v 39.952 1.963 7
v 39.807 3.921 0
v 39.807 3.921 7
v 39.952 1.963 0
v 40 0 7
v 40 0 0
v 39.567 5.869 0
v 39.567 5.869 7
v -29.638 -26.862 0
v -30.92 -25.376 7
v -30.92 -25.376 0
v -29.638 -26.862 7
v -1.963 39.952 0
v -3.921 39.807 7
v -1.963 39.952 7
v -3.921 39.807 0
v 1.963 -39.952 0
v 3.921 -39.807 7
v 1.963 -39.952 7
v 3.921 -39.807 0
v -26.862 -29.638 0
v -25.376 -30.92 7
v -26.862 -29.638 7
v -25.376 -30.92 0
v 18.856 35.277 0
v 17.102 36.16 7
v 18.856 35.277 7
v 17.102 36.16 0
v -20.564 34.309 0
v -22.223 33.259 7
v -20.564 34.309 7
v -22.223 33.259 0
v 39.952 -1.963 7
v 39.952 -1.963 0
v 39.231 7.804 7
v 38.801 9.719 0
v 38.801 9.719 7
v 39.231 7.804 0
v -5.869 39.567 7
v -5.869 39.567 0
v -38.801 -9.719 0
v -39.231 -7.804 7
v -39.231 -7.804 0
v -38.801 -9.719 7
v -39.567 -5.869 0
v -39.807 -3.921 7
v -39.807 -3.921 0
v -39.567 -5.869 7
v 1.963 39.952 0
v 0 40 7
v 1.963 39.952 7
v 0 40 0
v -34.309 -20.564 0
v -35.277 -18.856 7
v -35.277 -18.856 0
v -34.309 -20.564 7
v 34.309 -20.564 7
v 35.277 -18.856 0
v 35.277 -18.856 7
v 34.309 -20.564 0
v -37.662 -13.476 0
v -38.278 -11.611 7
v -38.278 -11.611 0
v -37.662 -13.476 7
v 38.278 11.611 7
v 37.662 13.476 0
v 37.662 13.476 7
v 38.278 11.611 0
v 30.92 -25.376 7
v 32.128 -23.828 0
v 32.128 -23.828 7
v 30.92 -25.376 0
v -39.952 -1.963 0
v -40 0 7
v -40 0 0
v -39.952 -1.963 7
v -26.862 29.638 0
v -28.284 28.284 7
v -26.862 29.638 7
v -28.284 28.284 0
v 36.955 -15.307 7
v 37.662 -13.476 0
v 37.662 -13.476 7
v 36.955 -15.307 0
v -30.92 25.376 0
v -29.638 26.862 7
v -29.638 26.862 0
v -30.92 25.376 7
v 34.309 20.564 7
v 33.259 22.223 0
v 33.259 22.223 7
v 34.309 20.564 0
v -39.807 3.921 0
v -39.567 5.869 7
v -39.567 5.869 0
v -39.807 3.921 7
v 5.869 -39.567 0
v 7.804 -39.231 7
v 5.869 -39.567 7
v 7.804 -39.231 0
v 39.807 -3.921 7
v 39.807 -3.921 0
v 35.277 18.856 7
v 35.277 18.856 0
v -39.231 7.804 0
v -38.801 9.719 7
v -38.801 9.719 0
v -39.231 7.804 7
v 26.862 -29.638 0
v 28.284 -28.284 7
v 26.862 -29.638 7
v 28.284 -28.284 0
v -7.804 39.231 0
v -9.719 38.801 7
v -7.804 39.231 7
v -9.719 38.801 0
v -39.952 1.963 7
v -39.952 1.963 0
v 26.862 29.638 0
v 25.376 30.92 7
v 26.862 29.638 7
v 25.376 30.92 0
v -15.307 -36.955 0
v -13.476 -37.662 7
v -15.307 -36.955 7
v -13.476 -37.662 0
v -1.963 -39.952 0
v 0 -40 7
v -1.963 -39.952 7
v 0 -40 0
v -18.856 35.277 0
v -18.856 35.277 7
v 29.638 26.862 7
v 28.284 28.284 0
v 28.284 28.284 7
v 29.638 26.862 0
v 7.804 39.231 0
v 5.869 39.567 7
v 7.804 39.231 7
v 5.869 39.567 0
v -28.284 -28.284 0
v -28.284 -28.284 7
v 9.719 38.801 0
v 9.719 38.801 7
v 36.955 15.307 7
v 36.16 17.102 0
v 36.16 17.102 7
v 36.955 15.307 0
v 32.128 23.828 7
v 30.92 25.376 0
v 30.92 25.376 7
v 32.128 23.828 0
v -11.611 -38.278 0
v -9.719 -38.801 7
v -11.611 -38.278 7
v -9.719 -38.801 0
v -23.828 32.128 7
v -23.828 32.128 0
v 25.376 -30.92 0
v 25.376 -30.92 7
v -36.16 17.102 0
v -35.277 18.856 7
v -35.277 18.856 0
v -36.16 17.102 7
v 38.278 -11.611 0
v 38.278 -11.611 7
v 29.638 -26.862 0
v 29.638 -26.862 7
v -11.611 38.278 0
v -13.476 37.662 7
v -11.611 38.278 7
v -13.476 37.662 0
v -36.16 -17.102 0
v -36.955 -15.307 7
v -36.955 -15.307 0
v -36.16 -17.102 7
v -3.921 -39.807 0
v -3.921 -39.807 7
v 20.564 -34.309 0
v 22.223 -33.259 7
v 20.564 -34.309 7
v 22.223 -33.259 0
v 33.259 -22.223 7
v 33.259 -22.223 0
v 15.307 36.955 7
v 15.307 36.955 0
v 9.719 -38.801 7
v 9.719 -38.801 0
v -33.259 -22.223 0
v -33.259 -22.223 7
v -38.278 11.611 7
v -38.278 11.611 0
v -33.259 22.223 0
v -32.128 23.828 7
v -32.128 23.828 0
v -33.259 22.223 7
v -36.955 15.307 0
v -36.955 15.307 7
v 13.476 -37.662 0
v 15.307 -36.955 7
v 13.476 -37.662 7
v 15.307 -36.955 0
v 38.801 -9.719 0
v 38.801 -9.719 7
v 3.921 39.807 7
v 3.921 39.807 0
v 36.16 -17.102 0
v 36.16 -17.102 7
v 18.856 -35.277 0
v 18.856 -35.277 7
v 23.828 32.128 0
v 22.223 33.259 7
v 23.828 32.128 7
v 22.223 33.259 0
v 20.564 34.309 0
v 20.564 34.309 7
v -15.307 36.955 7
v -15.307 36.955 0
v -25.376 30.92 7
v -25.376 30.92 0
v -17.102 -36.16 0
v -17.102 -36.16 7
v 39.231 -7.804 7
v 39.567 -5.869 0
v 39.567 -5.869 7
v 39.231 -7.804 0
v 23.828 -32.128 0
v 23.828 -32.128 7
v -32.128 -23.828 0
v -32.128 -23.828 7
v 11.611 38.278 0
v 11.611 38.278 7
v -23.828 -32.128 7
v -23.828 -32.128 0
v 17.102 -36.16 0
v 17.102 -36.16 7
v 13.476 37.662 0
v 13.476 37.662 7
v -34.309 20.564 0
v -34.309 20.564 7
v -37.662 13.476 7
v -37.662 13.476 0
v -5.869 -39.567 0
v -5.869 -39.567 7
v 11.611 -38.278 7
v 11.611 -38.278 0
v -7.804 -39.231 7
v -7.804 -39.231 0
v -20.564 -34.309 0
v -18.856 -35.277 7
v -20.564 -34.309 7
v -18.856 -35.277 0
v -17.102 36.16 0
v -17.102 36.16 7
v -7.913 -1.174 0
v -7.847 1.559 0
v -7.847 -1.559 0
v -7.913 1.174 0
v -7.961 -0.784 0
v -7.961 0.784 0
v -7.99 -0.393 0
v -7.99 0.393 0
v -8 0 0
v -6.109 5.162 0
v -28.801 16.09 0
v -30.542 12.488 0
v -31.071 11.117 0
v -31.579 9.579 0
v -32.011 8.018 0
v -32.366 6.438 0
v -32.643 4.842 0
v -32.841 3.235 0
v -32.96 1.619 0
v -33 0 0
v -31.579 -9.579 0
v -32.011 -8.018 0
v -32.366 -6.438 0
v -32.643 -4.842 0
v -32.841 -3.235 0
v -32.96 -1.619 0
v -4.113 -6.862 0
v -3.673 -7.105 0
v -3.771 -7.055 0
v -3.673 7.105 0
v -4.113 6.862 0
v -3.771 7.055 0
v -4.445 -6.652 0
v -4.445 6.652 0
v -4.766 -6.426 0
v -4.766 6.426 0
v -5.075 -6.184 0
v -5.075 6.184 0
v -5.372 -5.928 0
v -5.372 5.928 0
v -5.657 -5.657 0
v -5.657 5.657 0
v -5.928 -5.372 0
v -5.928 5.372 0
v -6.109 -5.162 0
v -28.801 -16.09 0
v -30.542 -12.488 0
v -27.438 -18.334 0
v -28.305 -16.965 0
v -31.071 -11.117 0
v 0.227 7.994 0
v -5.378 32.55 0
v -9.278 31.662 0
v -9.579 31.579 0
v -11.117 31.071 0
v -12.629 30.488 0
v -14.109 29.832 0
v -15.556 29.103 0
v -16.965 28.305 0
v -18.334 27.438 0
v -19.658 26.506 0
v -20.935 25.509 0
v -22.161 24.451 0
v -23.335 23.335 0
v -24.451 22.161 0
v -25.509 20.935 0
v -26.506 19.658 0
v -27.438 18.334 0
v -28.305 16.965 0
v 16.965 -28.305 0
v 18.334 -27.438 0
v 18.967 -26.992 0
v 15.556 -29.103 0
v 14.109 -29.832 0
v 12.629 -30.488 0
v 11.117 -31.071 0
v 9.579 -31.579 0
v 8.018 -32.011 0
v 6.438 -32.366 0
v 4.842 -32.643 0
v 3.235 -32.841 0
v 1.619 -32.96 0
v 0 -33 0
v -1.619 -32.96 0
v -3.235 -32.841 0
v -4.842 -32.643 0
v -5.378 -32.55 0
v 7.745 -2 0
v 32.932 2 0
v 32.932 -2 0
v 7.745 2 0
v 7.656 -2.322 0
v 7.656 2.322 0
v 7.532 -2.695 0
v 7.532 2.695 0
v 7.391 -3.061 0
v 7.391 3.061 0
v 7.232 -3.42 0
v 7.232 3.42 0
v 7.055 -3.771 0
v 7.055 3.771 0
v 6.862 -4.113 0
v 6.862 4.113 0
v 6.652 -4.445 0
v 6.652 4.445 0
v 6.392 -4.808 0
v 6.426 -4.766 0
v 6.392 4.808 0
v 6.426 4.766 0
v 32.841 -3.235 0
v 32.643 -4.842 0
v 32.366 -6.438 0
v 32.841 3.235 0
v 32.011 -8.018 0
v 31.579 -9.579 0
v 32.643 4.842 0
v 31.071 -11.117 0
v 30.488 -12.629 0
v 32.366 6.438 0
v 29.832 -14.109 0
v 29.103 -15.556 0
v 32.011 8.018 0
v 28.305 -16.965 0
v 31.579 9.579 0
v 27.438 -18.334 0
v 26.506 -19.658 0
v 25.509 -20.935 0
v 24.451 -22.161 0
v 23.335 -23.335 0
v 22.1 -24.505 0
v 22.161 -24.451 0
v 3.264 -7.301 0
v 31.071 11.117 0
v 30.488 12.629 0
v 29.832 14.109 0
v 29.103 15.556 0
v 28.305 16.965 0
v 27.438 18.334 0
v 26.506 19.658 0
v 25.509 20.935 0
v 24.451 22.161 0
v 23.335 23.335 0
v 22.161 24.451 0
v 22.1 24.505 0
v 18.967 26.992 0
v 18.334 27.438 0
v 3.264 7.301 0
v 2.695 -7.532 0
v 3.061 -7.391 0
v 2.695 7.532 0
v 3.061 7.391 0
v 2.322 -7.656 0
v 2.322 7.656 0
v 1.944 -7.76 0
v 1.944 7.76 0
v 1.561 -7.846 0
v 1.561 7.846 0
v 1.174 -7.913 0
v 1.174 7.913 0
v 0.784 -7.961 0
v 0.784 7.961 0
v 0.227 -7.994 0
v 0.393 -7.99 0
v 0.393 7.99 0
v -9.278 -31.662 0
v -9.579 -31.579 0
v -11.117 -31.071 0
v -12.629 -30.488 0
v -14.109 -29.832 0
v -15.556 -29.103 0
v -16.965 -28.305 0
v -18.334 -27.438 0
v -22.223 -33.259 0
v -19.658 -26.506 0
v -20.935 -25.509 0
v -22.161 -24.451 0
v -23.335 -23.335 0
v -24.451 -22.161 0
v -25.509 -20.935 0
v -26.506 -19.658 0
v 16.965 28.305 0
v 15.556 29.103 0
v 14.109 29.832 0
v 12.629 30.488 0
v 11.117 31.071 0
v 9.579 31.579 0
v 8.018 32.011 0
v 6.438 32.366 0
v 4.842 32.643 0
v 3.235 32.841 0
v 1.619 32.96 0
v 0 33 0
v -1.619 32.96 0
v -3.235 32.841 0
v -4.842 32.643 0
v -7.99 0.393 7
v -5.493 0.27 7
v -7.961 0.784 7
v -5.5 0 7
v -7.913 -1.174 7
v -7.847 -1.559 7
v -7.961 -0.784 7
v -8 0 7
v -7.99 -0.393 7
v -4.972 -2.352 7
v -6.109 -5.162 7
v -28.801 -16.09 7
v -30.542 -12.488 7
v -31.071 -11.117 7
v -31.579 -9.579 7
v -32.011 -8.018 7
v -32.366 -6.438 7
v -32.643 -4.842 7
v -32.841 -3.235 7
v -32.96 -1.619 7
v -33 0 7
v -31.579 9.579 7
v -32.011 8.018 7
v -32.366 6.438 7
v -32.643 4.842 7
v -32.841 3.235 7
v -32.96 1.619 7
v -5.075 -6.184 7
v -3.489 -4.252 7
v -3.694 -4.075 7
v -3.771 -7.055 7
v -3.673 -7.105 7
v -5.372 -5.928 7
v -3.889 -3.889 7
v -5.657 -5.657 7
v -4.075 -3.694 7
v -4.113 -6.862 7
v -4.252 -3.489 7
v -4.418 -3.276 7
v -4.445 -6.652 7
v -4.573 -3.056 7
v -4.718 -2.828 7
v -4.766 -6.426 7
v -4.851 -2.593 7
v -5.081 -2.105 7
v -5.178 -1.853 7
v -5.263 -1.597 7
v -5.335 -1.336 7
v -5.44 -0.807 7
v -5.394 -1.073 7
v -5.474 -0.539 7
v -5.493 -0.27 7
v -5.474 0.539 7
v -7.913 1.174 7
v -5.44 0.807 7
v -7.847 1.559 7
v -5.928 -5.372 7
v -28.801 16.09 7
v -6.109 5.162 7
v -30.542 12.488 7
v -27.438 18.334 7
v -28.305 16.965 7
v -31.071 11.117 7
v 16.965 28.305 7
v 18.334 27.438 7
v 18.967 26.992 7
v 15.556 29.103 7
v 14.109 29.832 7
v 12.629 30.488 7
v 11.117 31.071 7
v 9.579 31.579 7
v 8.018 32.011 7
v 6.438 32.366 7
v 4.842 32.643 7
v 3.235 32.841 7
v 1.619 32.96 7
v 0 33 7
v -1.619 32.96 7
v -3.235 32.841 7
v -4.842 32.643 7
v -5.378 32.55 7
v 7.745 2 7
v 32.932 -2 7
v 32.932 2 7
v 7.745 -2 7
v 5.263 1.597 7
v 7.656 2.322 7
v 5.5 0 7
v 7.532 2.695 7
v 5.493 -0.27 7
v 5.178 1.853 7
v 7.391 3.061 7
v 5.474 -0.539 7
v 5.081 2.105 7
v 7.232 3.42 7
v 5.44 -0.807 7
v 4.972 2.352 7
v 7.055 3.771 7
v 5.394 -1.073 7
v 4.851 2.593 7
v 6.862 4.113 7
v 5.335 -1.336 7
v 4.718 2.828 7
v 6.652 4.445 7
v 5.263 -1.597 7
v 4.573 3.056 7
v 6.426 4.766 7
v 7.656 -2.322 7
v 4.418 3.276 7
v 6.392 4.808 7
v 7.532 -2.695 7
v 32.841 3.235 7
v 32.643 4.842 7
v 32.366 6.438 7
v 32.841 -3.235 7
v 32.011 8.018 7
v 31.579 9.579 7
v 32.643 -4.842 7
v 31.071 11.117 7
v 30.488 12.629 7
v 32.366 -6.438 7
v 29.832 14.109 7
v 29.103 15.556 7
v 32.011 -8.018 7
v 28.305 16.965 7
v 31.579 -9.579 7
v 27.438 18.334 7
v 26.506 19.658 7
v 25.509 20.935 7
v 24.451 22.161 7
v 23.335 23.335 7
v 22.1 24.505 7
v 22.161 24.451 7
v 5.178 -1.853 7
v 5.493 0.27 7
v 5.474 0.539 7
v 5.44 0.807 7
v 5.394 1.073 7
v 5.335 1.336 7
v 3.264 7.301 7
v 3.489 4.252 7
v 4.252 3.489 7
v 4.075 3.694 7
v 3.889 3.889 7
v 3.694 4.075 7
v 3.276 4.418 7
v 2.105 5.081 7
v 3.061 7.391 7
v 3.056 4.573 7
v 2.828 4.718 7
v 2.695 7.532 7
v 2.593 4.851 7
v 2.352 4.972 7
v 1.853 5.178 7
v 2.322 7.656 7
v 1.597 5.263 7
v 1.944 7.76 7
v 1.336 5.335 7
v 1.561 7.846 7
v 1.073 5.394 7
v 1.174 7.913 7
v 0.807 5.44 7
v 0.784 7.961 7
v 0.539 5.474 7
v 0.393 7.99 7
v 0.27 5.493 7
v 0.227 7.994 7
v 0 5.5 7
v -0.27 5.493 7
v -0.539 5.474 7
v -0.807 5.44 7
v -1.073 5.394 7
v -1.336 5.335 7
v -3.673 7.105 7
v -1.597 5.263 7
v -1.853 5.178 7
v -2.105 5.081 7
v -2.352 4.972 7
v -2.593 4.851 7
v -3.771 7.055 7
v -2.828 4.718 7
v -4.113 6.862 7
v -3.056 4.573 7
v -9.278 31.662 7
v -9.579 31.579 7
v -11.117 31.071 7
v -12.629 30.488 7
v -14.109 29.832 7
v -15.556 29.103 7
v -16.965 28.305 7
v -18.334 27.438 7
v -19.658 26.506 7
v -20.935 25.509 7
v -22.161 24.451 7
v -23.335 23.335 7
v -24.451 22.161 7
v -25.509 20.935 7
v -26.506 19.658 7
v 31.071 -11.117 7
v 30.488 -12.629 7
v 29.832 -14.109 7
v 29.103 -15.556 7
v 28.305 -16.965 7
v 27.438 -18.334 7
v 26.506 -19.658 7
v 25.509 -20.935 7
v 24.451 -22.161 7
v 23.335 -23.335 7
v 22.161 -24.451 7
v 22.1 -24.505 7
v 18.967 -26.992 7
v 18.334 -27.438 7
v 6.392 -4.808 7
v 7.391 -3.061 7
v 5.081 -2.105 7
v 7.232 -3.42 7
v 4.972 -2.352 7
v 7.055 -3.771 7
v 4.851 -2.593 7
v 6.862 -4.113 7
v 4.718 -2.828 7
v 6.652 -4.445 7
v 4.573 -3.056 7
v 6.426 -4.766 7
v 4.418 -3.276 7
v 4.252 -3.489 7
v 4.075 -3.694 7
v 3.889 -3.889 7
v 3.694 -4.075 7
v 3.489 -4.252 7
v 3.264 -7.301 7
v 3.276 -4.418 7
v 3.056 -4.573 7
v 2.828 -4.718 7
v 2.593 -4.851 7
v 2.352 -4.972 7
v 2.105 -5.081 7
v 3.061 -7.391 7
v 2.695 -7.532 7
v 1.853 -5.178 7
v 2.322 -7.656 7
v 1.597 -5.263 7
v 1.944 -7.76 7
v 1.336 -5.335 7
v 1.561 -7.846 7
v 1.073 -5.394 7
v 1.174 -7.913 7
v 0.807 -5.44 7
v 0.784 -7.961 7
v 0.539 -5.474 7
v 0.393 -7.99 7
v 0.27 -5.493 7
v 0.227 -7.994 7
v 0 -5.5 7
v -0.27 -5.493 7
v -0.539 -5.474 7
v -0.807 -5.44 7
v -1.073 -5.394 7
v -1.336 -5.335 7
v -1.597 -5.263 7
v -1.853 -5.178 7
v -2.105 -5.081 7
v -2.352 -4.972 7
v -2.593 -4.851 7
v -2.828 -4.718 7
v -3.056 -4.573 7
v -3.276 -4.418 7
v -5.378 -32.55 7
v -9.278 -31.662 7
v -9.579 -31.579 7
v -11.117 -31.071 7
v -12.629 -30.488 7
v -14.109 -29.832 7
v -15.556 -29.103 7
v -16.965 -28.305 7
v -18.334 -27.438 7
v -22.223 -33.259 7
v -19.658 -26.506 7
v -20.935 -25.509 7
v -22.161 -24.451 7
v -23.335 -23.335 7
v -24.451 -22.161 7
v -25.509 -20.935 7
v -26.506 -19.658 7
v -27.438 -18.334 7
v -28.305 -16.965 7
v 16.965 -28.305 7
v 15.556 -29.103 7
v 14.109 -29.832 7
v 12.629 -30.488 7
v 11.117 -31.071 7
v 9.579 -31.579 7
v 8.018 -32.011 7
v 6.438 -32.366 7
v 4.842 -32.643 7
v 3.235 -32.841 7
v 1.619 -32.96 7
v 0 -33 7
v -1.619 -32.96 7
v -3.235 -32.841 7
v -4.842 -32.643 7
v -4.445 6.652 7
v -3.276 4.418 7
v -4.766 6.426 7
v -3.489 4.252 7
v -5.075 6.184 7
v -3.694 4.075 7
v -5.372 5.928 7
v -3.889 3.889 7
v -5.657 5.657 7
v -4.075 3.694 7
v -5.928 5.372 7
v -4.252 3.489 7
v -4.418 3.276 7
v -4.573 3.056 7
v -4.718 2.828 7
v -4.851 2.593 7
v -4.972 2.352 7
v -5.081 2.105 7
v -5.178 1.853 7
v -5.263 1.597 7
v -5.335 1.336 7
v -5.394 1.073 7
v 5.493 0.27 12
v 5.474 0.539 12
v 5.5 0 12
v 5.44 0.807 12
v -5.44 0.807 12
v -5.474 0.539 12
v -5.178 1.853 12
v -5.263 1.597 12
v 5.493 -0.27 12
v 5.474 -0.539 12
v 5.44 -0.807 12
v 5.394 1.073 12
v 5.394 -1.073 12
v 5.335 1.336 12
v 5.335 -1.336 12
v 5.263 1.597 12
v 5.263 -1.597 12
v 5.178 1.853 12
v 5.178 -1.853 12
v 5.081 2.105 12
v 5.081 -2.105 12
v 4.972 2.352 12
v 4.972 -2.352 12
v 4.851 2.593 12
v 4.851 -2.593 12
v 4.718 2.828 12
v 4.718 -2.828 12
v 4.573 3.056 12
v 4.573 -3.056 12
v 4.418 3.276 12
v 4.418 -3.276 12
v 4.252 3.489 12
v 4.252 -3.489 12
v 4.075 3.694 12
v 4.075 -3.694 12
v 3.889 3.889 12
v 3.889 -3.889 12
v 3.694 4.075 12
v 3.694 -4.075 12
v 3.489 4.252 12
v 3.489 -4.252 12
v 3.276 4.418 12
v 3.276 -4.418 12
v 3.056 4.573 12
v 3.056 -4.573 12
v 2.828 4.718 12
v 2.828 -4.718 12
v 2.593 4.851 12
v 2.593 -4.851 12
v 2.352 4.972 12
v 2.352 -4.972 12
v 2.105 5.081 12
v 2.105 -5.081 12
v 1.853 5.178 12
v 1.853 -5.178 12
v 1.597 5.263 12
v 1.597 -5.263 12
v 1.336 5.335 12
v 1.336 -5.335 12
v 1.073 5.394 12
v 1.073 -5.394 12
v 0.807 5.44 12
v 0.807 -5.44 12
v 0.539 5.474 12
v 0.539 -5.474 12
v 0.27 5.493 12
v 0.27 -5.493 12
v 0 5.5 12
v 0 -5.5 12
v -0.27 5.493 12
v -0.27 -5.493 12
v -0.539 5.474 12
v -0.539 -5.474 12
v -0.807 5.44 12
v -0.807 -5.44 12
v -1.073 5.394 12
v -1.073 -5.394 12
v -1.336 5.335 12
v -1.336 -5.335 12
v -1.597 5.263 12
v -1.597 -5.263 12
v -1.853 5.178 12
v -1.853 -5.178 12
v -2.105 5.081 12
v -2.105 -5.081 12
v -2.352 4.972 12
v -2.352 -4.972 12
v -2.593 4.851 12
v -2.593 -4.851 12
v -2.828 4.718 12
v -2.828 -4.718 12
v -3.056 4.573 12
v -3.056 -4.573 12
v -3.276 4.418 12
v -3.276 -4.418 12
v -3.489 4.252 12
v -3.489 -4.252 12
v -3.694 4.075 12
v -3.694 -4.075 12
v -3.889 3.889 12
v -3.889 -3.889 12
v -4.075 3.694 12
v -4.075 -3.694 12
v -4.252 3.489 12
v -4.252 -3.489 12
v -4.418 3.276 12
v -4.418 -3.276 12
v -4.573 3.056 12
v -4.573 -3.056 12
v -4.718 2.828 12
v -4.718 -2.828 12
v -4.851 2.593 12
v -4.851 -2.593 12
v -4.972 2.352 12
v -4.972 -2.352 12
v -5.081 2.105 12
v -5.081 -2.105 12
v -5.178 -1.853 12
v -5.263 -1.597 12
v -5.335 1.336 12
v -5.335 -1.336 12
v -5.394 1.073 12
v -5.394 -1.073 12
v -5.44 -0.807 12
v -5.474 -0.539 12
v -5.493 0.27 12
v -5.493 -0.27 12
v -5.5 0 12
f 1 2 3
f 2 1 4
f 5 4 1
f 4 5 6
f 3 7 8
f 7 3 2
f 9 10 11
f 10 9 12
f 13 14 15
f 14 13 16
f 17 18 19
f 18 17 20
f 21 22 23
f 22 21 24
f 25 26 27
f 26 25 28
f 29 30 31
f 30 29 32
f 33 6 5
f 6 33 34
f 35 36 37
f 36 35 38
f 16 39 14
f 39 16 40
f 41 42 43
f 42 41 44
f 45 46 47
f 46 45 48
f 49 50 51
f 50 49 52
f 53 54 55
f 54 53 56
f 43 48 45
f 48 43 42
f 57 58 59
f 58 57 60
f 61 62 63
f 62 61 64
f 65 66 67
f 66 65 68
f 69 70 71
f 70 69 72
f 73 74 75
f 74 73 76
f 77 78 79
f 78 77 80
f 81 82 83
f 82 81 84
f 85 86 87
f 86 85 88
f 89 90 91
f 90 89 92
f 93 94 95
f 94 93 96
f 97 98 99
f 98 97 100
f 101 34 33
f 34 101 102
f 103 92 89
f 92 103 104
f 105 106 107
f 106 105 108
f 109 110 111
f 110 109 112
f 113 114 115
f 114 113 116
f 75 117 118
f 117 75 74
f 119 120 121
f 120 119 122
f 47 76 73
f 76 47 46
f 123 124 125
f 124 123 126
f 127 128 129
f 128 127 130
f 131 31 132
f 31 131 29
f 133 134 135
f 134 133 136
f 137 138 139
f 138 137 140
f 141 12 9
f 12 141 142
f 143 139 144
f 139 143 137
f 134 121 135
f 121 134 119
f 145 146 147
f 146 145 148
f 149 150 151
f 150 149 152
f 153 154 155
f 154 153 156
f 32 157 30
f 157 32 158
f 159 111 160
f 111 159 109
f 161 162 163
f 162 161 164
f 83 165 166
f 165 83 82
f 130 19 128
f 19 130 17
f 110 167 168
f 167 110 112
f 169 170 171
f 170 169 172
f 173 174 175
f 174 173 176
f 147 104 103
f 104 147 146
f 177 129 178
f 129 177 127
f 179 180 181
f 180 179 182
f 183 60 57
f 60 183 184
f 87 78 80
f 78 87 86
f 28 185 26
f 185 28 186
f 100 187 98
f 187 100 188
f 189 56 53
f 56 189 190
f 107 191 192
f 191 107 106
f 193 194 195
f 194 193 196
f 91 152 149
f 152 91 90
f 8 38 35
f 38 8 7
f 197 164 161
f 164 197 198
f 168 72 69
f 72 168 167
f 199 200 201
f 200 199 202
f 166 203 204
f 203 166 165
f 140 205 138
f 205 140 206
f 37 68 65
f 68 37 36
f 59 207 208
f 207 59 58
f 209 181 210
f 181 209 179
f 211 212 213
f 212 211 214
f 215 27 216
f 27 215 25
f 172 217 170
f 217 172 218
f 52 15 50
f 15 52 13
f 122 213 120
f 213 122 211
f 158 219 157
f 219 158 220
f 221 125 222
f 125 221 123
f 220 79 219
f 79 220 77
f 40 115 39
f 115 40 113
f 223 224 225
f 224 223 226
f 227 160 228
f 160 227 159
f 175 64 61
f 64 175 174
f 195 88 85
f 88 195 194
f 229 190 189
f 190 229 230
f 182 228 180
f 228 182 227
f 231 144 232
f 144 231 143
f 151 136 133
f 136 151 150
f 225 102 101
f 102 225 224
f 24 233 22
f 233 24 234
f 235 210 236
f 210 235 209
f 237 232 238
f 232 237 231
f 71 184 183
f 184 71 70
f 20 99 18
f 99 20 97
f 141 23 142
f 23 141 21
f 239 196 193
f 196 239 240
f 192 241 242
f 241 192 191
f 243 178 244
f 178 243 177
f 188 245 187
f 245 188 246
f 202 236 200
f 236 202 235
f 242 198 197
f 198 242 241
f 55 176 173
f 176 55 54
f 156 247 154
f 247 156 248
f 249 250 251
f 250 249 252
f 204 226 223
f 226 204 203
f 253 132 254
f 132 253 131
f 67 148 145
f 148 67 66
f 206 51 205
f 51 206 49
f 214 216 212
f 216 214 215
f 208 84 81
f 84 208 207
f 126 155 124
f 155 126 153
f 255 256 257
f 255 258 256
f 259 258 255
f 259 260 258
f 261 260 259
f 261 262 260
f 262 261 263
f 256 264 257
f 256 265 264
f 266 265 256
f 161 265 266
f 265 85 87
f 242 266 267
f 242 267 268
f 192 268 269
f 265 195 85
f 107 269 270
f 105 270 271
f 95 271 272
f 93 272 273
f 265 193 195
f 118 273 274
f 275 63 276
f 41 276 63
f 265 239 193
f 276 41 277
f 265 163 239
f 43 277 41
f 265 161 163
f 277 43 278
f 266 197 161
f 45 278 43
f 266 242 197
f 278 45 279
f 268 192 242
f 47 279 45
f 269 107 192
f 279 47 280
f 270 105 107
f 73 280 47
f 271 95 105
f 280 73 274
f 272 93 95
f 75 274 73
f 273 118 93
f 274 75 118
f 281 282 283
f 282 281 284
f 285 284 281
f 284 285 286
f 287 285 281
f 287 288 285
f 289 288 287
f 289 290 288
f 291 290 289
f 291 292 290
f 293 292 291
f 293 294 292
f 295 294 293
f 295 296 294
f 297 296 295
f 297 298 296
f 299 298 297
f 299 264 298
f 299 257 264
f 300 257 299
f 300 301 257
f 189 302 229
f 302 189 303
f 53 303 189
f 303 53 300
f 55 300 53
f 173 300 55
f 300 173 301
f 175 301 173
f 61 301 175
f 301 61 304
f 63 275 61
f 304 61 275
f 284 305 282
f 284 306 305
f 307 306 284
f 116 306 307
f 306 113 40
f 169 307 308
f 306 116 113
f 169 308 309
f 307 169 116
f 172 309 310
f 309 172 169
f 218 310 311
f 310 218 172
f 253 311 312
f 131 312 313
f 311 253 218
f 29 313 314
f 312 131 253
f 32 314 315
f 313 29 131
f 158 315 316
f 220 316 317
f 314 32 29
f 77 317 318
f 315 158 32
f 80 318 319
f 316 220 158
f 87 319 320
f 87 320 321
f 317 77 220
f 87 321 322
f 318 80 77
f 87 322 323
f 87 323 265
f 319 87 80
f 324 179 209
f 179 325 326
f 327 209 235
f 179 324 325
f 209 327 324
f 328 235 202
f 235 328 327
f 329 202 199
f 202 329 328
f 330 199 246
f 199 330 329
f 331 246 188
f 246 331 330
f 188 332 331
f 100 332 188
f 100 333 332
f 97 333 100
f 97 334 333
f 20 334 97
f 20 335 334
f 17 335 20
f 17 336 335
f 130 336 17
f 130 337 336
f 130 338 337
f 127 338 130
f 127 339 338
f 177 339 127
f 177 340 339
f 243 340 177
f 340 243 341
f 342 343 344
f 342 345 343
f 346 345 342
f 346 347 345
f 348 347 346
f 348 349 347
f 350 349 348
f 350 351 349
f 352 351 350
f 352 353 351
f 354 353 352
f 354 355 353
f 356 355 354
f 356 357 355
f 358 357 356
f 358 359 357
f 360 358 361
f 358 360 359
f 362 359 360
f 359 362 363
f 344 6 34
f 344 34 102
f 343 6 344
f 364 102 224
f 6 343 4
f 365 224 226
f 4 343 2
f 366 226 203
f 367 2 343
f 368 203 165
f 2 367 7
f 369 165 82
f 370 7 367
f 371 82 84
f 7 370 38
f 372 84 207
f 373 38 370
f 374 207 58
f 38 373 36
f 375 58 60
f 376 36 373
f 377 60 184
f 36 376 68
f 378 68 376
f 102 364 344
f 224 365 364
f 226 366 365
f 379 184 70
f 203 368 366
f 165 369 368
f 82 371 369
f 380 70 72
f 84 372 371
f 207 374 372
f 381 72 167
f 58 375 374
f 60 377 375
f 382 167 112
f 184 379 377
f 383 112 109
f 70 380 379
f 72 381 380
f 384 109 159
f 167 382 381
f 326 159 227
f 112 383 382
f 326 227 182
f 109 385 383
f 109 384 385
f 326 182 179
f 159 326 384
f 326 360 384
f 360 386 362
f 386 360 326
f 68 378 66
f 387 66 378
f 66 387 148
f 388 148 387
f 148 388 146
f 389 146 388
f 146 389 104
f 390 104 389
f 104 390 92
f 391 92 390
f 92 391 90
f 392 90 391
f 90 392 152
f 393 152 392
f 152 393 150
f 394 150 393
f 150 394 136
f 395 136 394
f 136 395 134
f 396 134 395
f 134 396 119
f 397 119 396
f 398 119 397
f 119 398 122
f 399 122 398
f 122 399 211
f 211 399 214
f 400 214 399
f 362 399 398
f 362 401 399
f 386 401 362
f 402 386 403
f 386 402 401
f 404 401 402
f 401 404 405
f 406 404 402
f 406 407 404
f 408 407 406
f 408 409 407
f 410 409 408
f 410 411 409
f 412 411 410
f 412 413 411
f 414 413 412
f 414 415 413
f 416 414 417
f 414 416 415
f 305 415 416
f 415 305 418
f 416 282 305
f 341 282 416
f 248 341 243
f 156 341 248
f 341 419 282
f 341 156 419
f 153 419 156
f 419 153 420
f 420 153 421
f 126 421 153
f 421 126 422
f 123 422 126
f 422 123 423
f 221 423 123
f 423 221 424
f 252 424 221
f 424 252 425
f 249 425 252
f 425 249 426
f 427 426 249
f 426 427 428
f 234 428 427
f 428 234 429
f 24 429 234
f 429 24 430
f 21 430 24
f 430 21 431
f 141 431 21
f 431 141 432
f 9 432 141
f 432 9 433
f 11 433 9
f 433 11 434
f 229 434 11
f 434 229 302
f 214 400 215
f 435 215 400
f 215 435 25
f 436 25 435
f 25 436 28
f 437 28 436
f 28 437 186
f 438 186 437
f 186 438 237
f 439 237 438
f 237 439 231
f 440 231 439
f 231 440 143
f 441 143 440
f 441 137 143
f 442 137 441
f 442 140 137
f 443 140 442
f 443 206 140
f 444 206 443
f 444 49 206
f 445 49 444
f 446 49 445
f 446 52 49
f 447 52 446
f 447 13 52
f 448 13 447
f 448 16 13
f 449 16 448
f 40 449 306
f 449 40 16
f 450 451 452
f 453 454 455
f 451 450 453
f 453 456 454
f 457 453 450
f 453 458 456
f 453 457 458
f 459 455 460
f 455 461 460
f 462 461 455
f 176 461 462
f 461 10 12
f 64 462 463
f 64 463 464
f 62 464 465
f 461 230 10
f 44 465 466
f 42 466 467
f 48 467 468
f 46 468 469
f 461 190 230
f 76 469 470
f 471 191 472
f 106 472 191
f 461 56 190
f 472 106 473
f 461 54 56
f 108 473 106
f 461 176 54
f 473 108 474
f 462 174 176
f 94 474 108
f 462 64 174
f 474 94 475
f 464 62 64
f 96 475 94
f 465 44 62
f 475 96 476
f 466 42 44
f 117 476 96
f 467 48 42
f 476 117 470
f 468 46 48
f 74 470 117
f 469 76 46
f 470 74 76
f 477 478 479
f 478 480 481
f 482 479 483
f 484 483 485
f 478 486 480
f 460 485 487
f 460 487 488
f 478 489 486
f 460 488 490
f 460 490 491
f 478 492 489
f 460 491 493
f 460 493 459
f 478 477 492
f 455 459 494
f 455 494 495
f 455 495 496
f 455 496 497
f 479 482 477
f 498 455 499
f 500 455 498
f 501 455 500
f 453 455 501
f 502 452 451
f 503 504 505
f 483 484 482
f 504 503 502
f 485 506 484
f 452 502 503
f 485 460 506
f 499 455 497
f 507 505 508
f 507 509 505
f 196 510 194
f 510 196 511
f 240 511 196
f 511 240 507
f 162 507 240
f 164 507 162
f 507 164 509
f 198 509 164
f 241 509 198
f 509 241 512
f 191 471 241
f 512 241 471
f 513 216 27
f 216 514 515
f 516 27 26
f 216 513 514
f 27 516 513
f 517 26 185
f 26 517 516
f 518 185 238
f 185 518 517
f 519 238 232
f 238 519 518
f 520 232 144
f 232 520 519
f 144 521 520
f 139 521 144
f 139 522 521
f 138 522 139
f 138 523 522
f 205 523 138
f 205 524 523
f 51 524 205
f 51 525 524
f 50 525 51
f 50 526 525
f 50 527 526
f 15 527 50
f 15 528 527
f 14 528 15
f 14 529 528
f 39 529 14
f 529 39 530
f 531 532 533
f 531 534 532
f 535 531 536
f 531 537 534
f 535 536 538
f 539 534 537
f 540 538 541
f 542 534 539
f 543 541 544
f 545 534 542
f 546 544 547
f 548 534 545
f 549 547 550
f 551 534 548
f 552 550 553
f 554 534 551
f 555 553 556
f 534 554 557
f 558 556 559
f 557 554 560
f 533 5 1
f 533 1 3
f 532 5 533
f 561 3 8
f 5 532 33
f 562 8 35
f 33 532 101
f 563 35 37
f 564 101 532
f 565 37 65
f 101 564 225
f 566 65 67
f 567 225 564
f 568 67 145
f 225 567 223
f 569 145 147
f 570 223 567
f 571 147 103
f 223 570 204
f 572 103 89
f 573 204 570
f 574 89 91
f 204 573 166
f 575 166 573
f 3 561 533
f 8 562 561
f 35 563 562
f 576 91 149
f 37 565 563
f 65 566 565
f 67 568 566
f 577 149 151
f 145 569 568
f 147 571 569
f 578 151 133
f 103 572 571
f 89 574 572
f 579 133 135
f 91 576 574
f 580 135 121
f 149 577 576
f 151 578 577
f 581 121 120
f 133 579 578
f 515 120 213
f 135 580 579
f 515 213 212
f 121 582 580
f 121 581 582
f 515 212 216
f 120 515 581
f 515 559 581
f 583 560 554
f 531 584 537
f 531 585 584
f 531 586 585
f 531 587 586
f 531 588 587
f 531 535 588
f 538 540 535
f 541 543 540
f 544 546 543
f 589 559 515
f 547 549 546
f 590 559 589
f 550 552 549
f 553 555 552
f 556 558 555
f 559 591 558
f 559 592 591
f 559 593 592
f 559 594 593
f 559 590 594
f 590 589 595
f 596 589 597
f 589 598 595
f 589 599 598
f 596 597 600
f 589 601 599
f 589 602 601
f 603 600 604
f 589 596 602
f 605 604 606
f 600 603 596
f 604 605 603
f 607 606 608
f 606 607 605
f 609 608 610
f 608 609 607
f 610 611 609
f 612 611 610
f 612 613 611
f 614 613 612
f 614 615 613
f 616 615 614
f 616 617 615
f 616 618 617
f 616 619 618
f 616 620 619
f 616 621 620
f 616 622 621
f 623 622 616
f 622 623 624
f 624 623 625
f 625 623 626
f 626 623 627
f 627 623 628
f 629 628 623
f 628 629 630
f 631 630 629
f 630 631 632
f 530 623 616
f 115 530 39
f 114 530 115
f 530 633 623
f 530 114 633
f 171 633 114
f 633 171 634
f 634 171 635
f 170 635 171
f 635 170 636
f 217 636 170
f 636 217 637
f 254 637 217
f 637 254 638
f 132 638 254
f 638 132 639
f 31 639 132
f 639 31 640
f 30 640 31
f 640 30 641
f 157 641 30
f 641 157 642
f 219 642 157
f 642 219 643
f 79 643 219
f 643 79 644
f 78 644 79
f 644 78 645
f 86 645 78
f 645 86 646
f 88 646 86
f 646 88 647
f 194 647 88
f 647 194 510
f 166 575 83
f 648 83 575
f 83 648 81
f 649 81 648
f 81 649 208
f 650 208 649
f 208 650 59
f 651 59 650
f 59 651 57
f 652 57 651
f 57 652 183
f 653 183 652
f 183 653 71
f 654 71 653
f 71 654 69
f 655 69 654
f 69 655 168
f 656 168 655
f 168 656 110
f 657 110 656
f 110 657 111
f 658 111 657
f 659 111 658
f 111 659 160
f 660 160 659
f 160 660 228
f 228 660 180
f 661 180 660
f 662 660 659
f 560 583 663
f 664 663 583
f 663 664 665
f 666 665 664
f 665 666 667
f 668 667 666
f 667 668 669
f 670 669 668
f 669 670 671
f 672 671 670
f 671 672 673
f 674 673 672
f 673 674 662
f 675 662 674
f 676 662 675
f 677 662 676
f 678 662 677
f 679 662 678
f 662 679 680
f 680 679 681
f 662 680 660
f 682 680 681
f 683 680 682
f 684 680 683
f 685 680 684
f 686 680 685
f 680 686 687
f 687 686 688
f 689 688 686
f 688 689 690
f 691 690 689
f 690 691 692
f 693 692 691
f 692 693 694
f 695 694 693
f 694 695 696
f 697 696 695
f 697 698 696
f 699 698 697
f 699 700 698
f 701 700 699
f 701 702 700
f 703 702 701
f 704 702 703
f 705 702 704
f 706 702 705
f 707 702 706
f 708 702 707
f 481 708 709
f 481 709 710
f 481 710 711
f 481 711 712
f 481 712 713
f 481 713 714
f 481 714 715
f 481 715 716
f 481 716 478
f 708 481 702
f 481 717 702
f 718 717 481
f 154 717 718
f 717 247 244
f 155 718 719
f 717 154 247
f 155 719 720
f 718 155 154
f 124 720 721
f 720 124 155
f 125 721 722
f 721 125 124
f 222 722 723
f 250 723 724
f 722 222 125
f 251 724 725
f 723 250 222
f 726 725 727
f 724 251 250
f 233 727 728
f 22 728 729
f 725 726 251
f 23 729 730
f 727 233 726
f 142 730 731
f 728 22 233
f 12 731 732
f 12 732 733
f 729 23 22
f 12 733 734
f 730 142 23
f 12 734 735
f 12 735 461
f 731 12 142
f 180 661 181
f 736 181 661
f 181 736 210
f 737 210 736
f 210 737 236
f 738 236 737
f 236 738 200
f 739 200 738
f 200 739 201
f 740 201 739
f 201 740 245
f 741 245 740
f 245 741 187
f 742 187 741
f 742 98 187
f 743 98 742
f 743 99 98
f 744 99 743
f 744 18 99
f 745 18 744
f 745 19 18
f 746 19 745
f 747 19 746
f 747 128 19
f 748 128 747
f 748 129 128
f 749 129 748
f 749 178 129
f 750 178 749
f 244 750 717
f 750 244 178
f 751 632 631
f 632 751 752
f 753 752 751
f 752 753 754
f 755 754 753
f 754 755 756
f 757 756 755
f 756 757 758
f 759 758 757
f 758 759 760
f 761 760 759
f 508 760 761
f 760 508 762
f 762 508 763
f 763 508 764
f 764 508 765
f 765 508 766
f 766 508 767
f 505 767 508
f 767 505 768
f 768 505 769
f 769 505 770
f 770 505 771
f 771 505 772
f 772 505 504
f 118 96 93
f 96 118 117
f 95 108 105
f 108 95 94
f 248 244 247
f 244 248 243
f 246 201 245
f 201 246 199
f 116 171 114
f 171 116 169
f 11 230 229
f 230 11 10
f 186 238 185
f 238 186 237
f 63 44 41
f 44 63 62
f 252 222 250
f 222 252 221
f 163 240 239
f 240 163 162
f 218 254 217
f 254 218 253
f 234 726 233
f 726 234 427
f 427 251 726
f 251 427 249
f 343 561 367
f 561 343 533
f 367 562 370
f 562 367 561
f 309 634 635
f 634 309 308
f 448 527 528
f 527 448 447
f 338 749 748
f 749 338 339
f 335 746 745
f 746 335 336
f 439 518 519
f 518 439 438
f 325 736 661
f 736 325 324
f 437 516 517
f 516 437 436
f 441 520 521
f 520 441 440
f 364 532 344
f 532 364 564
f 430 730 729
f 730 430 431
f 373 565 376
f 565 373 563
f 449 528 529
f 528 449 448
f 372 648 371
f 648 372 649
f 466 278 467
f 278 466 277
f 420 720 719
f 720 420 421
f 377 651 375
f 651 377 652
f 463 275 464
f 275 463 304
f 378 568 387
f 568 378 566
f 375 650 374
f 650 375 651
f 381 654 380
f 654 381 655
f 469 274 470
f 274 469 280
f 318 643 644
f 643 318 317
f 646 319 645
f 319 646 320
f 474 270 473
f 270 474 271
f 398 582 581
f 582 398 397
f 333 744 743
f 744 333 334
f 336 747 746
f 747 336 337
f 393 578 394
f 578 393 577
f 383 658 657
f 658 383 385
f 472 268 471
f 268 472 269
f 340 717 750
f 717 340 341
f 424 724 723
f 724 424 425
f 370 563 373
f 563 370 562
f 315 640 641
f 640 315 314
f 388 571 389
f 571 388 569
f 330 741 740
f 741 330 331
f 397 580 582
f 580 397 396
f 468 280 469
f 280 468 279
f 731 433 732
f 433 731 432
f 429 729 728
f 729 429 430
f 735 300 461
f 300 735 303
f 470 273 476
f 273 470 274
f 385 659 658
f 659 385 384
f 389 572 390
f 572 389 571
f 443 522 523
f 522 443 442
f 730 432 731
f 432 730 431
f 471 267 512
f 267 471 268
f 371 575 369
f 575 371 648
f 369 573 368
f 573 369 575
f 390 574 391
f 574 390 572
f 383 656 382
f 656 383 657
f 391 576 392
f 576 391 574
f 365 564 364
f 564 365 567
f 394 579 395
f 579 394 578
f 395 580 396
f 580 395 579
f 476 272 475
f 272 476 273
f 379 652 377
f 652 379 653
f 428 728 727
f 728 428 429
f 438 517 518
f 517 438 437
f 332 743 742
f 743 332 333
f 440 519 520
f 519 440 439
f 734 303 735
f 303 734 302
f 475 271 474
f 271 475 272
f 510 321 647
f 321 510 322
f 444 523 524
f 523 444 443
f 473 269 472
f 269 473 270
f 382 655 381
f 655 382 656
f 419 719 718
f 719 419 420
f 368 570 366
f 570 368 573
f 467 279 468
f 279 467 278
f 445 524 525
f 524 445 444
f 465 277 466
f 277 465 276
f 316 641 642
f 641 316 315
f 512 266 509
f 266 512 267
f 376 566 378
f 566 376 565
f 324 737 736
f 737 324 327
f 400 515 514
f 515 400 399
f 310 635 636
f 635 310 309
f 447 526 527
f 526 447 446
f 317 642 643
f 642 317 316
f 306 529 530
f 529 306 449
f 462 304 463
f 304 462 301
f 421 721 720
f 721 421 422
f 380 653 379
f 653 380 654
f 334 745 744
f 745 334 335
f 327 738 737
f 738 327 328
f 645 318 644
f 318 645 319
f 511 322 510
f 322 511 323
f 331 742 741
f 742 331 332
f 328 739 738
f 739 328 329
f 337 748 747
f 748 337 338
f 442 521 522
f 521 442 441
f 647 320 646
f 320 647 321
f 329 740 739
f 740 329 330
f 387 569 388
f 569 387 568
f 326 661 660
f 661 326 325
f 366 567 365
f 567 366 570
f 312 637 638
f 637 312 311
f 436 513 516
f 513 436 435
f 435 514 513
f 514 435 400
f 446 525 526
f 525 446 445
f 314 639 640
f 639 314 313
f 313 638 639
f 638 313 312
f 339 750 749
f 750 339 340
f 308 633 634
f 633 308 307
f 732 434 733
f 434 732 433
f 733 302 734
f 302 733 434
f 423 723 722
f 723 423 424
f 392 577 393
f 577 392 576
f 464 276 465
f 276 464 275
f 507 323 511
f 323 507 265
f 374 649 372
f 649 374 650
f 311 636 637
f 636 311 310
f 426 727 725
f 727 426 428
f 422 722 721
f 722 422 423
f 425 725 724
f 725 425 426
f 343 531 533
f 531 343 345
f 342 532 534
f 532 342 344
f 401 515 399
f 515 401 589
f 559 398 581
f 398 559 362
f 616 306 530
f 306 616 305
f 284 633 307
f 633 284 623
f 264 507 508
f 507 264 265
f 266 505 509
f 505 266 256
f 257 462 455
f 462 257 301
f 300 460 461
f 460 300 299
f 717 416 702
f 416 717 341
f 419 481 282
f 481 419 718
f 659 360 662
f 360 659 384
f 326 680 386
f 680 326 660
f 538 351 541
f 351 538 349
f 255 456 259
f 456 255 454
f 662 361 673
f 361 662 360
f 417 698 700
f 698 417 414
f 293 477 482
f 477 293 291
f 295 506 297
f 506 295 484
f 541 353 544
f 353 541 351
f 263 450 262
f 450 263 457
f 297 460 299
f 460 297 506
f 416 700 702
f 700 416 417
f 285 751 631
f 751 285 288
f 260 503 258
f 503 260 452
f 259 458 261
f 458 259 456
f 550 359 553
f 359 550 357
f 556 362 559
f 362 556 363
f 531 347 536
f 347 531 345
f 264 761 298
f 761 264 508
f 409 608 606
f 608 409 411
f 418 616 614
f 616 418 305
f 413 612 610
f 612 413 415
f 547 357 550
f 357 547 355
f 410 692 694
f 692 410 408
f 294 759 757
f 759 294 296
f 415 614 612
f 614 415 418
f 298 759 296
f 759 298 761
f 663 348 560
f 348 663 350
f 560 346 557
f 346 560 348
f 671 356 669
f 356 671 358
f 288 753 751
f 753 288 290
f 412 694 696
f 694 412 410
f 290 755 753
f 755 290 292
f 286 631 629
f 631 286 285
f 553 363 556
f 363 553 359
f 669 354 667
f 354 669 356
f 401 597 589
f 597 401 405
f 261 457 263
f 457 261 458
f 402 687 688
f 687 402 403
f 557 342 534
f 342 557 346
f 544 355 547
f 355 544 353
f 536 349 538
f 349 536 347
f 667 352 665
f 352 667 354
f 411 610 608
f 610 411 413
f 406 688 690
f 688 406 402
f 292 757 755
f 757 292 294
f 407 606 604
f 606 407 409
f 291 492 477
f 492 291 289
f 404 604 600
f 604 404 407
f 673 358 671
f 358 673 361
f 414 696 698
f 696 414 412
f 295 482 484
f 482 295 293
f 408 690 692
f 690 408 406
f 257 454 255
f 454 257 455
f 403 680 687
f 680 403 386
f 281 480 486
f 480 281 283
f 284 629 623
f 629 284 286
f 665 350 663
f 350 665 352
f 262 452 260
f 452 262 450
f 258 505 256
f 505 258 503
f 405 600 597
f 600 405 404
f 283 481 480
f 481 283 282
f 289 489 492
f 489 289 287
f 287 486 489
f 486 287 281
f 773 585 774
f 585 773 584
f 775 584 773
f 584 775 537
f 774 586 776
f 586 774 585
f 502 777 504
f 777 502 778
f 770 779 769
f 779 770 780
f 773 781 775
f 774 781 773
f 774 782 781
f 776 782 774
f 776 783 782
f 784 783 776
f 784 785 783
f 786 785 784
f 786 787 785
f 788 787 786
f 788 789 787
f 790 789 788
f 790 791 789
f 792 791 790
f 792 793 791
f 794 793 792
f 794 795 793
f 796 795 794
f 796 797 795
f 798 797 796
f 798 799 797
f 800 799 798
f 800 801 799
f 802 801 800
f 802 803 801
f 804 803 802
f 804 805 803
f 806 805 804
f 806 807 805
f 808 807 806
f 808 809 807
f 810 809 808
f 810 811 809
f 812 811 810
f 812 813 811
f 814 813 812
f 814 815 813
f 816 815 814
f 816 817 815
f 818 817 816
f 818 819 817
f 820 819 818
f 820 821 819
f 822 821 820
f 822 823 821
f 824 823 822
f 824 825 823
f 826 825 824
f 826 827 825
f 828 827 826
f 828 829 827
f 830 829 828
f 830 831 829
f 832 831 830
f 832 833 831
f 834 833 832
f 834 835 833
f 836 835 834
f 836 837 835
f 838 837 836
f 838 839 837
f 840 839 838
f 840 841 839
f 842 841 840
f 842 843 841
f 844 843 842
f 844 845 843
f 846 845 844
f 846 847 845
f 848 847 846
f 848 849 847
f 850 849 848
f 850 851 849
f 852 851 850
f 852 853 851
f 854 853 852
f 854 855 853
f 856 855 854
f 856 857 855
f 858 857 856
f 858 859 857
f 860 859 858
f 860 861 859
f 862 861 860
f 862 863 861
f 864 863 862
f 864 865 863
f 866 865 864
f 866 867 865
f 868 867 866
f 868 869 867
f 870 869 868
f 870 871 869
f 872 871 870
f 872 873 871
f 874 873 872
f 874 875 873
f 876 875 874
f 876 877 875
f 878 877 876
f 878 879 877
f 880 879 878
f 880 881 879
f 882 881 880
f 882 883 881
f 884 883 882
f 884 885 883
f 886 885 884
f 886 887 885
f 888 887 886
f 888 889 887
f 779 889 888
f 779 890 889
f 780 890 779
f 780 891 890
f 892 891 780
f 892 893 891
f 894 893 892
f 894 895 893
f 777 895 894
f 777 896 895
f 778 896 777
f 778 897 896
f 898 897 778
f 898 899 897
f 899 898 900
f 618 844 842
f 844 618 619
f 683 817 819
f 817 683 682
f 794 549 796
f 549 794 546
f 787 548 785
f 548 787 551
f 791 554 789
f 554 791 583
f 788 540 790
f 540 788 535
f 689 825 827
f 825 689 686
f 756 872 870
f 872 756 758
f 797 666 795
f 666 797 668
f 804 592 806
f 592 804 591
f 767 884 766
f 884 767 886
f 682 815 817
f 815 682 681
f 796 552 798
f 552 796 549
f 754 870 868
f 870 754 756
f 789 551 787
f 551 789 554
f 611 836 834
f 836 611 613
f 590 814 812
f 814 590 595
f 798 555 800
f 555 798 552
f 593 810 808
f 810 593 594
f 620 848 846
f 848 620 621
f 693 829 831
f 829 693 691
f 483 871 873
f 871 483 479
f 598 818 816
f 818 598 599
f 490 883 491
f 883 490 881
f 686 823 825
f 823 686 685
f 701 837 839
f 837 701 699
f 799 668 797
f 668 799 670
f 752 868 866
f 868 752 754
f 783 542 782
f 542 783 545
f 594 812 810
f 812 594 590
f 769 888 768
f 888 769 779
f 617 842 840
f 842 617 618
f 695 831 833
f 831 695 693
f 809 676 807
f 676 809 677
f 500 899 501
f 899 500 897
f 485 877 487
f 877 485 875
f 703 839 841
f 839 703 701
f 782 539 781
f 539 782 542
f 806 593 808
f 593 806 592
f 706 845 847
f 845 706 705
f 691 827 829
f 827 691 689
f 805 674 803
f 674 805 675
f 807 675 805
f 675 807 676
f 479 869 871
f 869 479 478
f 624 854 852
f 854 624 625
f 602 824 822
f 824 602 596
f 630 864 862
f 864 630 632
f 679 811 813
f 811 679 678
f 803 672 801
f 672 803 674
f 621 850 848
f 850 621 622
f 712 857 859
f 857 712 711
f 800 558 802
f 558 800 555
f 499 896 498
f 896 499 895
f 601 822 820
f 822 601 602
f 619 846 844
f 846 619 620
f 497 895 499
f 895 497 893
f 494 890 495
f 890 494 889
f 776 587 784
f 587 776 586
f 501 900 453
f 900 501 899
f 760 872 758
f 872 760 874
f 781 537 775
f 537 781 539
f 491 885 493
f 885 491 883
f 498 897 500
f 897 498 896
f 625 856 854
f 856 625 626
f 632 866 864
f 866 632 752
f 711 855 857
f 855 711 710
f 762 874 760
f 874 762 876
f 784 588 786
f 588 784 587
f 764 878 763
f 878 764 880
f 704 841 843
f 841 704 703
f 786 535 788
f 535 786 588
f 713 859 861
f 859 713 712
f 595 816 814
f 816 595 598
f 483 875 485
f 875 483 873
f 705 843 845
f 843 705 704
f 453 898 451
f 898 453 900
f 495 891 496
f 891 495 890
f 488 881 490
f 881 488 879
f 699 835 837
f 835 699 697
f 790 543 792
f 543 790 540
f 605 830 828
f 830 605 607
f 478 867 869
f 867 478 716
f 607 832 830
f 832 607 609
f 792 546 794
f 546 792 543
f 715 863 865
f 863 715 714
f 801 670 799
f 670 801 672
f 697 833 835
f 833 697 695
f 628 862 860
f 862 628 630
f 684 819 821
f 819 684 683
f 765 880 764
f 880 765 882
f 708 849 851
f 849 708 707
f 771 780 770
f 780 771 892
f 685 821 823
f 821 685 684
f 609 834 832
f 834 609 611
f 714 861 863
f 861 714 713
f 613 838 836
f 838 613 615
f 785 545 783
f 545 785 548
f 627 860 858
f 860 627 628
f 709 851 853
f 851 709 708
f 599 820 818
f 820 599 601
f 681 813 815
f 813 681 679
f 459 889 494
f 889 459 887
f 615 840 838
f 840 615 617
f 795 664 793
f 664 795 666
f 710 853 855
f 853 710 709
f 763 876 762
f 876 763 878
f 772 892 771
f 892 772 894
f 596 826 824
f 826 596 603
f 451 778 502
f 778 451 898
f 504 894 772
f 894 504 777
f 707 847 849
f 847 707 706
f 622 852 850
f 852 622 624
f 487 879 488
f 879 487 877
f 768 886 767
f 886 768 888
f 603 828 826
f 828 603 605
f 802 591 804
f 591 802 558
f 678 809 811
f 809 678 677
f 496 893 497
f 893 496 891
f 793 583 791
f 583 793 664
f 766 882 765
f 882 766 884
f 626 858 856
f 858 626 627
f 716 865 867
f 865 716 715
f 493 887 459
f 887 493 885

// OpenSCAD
$fn = 128;

module wheel(spokeCount = 12) {
    module spoke() {
        translate([0, -2, 0]) cube([38, 4, 7]); 
        }

    union() {
        difference() {
            cylinder(h = 7, r = 40);
            translate([0,0,-1]) cylinder(h = 10, r = 33);
            }

        for (az = [0 : spokeCount])
            rotate([0, 0, az*(360/spokeCount)]) spoke(); 
        
        cylinder(h = 7, r = 8);
        cylinder(h = 12, r = 5.5);
        }
    }

wheel(7);
